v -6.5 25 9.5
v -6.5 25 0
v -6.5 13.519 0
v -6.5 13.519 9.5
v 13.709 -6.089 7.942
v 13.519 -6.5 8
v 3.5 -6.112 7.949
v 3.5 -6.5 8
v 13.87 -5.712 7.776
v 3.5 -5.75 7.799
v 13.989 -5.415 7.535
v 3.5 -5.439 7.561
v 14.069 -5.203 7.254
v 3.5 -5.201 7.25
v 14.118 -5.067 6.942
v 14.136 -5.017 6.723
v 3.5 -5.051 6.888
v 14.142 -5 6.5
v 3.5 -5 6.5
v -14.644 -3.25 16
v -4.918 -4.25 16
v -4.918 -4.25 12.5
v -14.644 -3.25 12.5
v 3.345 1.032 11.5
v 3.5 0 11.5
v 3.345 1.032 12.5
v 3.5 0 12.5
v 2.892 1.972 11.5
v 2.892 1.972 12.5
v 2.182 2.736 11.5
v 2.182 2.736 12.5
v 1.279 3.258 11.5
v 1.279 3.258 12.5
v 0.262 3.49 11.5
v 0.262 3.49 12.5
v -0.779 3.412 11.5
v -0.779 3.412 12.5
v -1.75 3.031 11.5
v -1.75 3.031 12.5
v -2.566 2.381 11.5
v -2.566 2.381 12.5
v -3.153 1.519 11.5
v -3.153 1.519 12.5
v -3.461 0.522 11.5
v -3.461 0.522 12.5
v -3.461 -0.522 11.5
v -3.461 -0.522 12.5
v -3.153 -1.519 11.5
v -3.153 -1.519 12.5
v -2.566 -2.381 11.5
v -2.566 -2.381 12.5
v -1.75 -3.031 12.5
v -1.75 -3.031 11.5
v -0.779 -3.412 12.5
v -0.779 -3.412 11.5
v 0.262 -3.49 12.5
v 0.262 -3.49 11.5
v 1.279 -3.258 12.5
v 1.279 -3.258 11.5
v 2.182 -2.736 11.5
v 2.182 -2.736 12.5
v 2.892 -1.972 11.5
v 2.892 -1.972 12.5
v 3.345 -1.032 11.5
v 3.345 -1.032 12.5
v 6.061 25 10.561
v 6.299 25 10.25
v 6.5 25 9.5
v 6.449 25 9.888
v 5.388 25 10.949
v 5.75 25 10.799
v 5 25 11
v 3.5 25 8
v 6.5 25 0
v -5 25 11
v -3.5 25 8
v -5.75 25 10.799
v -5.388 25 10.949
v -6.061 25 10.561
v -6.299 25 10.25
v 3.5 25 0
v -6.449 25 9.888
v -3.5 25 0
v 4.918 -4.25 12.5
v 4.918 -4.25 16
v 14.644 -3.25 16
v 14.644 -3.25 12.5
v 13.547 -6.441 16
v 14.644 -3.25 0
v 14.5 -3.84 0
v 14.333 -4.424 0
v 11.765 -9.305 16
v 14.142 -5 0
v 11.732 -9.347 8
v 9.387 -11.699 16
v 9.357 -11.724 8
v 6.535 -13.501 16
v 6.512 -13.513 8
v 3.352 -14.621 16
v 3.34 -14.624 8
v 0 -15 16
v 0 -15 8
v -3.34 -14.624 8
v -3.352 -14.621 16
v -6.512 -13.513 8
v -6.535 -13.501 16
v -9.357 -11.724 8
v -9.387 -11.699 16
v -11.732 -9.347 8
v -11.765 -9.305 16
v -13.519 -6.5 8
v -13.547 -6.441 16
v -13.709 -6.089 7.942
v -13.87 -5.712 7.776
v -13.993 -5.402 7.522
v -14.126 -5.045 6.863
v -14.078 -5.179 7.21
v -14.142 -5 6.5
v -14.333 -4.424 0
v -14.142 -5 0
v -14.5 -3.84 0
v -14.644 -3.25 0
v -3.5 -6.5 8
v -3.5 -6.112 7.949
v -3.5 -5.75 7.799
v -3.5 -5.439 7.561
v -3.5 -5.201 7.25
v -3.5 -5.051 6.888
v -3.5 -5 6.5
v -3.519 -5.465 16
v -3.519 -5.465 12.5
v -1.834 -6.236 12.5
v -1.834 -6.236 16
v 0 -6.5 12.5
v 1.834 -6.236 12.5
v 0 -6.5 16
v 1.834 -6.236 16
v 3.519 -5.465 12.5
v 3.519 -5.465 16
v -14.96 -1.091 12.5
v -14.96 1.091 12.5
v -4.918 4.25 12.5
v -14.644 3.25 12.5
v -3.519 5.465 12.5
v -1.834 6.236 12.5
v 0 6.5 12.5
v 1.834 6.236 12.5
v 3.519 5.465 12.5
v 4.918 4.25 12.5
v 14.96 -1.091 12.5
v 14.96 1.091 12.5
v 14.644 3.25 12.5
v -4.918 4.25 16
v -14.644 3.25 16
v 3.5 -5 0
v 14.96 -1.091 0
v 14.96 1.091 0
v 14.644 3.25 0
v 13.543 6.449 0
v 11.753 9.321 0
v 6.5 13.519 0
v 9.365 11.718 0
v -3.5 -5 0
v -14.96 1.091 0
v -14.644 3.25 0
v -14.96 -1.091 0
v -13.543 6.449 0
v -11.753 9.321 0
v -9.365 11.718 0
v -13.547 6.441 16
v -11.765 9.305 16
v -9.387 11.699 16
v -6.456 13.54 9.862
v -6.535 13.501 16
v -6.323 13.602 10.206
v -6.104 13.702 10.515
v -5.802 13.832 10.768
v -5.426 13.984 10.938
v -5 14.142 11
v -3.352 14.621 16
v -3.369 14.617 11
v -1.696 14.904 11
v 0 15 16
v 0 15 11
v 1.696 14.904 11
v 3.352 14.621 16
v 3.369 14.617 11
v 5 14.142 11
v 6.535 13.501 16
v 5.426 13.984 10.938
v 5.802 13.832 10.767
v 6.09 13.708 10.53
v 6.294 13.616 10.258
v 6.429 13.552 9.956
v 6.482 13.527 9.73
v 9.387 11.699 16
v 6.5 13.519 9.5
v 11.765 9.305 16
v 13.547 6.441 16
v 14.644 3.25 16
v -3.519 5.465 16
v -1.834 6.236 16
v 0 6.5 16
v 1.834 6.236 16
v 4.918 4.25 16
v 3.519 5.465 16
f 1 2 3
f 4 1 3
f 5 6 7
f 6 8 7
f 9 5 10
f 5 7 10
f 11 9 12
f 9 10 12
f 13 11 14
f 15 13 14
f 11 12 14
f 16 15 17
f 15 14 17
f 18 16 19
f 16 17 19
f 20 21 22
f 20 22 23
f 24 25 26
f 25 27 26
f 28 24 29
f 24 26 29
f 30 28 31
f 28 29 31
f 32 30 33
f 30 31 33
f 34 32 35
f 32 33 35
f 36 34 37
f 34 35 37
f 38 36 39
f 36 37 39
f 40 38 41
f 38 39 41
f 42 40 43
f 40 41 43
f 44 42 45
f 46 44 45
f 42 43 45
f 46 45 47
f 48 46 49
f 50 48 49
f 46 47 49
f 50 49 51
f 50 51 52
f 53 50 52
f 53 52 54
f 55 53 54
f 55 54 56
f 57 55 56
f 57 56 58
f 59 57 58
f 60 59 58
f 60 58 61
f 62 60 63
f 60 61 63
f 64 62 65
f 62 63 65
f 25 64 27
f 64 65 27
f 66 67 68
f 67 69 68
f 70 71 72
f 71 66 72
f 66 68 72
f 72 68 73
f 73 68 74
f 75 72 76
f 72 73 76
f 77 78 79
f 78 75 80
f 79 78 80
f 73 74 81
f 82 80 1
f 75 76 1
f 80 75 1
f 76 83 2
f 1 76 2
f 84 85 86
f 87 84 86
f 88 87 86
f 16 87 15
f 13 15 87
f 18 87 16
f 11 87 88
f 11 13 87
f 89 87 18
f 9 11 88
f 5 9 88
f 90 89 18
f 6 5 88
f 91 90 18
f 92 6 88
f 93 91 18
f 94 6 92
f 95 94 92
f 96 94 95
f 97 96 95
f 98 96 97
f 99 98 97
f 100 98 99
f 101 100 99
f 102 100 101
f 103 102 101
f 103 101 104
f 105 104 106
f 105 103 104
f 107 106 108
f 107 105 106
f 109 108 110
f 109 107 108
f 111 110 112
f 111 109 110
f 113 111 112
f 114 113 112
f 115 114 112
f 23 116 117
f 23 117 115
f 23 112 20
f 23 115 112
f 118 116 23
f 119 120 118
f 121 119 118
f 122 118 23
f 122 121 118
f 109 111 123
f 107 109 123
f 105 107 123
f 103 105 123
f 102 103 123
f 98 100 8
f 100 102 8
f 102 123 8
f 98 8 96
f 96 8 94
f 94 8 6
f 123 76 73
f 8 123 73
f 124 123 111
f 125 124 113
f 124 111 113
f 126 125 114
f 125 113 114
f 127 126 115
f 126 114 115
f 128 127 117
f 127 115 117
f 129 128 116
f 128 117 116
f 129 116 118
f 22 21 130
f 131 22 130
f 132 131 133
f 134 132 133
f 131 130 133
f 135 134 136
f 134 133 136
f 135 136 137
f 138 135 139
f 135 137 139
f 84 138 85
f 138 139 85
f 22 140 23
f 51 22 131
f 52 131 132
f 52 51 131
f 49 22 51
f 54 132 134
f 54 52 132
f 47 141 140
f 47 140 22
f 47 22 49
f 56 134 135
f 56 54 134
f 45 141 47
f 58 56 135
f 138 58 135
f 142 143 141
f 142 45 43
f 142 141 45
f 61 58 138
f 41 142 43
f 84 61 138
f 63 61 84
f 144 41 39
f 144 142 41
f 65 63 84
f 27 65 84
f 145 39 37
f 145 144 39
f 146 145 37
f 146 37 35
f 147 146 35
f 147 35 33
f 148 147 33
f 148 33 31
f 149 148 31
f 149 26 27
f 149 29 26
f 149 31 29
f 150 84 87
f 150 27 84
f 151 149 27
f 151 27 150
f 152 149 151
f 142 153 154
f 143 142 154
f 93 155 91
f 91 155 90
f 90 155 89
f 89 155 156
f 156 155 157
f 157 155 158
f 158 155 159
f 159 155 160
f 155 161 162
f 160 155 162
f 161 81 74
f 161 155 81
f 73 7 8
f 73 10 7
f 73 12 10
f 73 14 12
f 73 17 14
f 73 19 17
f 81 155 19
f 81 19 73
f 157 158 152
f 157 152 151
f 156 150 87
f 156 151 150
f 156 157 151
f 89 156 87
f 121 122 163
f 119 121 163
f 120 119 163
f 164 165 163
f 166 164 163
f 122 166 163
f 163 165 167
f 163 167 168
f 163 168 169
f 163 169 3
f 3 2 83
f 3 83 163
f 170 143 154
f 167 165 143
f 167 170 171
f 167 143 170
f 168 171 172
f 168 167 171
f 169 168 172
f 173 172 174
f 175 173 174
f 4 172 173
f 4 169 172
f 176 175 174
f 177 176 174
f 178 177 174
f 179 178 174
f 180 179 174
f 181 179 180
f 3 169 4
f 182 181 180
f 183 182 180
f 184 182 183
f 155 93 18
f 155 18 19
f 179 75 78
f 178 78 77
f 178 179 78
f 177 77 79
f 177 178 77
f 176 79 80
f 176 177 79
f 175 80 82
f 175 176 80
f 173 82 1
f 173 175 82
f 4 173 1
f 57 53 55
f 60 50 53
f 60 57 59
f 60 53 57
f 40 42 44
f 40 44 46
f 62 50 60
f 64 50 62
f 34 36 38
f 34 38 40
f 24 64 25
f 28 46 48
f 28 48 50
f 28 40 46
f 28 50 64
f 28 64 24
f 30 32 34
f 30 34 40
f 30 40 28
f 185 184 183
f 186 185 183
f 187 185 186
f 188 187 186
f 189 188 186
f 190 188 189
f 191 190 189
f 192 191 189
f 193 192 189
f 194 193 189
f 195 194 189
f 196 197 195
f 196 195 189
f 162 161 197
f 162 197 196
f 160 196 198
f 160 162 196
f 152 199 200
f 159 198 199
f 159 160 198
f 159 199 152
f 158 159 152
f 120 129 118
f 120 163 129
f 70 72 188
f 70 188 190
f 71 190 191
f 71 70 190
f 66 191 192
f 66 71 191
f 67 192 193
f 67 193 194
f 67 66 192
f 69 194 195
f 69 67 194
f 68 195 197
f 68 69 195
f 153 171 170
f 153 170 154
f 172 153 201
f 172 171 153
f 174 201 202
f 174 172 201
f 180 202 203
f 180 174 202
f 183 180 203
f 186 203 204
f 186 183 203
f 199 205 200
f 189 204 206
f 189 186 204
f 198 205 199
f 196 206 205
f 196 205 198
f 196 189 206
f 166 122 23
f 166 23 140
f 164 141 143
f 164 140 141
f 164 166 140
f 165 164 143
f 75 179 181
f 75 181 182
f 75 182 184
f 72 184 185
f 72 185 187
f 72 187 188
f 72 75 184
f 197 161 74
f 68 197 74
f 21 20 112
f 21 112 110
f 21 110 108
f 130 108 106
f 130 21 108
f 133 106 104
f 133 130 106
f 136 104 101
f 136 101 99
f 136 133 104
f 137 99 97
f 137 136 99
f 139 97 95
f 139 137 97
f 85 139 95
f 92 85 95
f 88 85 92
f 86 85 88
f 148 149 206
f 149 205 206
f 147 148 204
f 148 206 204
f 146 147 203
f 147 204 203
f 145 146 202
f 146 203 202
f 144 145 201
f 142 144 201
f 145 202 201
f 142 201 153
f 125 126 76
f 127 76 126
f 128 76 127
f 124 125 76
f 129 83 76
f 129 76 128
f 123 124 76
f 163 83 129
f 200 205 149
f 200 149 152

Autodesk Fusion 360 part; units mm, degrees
sketch "Sketch1" plane through (0, 0, 0) normal (0, 0, 1) x (1, 0, 0)
  circle A0 centre (0, 0) radius 6.5
  line L0 (-15, 0) -> (15, 0) construction
  line L1 (0, 15) -> (0, -15) construction
  arc A1 (-14.6437, -3.25) -> (0, -15) centre (0, 0) ccw
  arc A2 (14.6437, -3.25) -> (14.6437, 3.25) centre (0, 0) ccw
  arc A3 (-14.6437, 3.25) -> (-14.6437, -3.25) centre (0, 0) ccw
  arc A4 (0, 15) -> (-14.6437, 3.25) centre (0, 0) ccw
  arc A5 (0, -15) -> (14.6437, -3.25) centre (0, 0) ccw
  arc A6 (14.6437, 3.25) -> (0, 15) centre (0, 0) ccw
  line L2 (4.9181, 4.25) -> (4.9181, -4.25)
  line L3 (14.6437, 3.25) -> (14.6437, -3.25)
  line L4 (4.9181, -4.25) -> (14.6437, -3.25)
  line L5 (4.9181, 4.25) -> (14.6437, 3.25)
  line L6 (-14.6437, 3.25) -> (-14.6437, -3.25)
  line L7 (-4.9181, -4.25) -> (-14.6437, -3.25)
  line L8 (-4.9181, 4.25) -> (-4.9181, -4.25)
  line L9 (-4.9181, 4.25) -> (-14.6437, 3.25)
  circle A7 centre (0, 0) radius 3.5
  dimension "d1" = 30
  dimension "d2" = 13
  dimension "d5" = 6.5
  dimension "d6" = 8.5
  dimension "d25" = 7
extrude "Extrude1" add sketch "Sketch1" along normal blind 16 contours A0 L2 | A0 L3 L4 L5 | A0 L2 L8 | A0 A4 A6 L5 L9 | A0 A1 A5 L4 L7 | A0 L8 | A0 L6 L7 L9 | A2 L3 | A3 L6 | A7
extrude "Extrude2" cut sketch "Sketch1" against normal blind 3.5 from surface at 16 contours A0 L2 | A0 L3 L4 L5 | A0 L2 L8 | A0 L8 | A0 L6 L7 L9 | A2 L3 | A3 L6 | A7
sketch "Sketch2" plane through (0, 0, 0) normal (0, 0, 1) x (1, 0, 0)
  arc A0 (-14.6437, -3.25) -> (0, -15) centre (0, 0) ccw
  arc A1 (0, -15) -> (14.6437, -3.25) centre (0, 0) ccw
  arc A2 (14.6437, -3.25) -> (14.6437, 3.25) centre (0, 0) ccw
  arc A3 (14.6437, 3.25) -> (0, 15) centre (0, 0) ccw
  arc A4 (0, 15) -> (-14.6437, 3.25) centre (0, 0) ccw
  arc A5 (-14.6437, 3.25) -> (-14.6437, -3.25) centre (0, 0) ccw
  line L0 (3.5, 15) -> (-3.5, 15)
  line L1 (-3.5, 15) -> (-3.5, -15)
  line L2 (-3.5, -15) -> (3.5, -15)
  line L3 (3.5, -15) -> (3.5, 15)
  line L4 (3.5, 15) -> (-3.5, -15) construction
  line L5 (-3.5, 15) -> (3.5, -15) construction
  dimension "d29" = 7
  dimension "d30" = 30
extrude "Extrude5" cut sketch "Sketch1" against normal blind 1 from surface at 12.5 contours A7
extrude "Extrude6" cut sketch "Sketch2" along normal blind 8 contours A0 A1 A3 A4 L1 L3
sketch "Sketch3" plane through (0, 0, 0) normal (0, 0, 1) x (1, 0, 0)
  arc A0 (0, 15) -> (-14.6437, 3.25) centre (0, 0) ccw construction
  arc A1 (-14.6437, 3.25) -> (-14.6437, -3.25) centre (0, 0) ccw construction
  arc A2 (-14.6437, -3.25) -> (0, -15) centre (0, 0) ccw construction
  arc A3 (0, -15) -> (14.6437, -3.25) centre (0, 0) ccw construction
  arc A4 (14.6437, 3.25) -> (0, 15) centre (0, 0) ccw construction
  arc A5 (14.6437, -3.25) -> (14.6437, 3.25) centre (0, 0) ccw construction
  line L0 (15, -15) -> (15, -5)
  line L1 (15, -5) -> (-15, -5)
  line L2 (-15, -5) -> (-15, -15)
  line L3 (0, 15) -> (0, 10) construction
  line L4 (6.5, 10) -> (6.5, 25)
  line L5 (6.5, 25) -> (-6.5, 25)
  line L6 (-6.5, 25) -> (-6.5, 10)
  line L7 (-11.1803, 10) -> (-6.5, 10) construction
  line L8 (6.5, 10) -> (11.1803, 10) construction
  line L9 (-6.5, 10) -> (0, 10)
  line L10 (0, 10) -> (6.5, 10)
  line L11 (3.5, 15) -> (-3.5, 15) construction
  line L12 (3.5, -15) -> (3.5, 15)
  line L13 (-3.5, -15) -> (3.5, -15) construction
  line L14 (-3.5, 15) -> (-3.5, -15)
  line L15 (15, -15) -> (-15, -15)
  line L16 (-3.5, 15) -> (-3.5, 25)
  line L17 (3.5, 15) -> (3.5, 25)
  dimension "d38" = 10
  dimension "d39" = 30
  dimension "d40" = 5
  dimension "d41" = 15
  dimension "d42" = 13
  dimension "d43" = 6.5
  dimension "d46" = 15
extrude "Extrude7 (1)" add sketch "Sketch3" along normal blind 11 contours L4 L5 L10 L12 L17 | L5 L9 L10 L12 L14 L16 L17 | L5 L6 L9 L14 L16
extrude "Extrude8" cut sketch "Sketch3" along normal blind 8 contours L0 L1 L12 L15 | L1 L12 L14 L15 | L1 L2 L14 L15 | L5 L9 L10 L12 L14 L16 L17
fillet "Fillet1" radius 1.5 2 edges at (6.5, 19.2593, 11) (-6.5, 19.2593, 11)
fillet "Fillet2" radius 1.5 2 edges at (8.8211, -5, 8) (-8.8211, -5, 8)
